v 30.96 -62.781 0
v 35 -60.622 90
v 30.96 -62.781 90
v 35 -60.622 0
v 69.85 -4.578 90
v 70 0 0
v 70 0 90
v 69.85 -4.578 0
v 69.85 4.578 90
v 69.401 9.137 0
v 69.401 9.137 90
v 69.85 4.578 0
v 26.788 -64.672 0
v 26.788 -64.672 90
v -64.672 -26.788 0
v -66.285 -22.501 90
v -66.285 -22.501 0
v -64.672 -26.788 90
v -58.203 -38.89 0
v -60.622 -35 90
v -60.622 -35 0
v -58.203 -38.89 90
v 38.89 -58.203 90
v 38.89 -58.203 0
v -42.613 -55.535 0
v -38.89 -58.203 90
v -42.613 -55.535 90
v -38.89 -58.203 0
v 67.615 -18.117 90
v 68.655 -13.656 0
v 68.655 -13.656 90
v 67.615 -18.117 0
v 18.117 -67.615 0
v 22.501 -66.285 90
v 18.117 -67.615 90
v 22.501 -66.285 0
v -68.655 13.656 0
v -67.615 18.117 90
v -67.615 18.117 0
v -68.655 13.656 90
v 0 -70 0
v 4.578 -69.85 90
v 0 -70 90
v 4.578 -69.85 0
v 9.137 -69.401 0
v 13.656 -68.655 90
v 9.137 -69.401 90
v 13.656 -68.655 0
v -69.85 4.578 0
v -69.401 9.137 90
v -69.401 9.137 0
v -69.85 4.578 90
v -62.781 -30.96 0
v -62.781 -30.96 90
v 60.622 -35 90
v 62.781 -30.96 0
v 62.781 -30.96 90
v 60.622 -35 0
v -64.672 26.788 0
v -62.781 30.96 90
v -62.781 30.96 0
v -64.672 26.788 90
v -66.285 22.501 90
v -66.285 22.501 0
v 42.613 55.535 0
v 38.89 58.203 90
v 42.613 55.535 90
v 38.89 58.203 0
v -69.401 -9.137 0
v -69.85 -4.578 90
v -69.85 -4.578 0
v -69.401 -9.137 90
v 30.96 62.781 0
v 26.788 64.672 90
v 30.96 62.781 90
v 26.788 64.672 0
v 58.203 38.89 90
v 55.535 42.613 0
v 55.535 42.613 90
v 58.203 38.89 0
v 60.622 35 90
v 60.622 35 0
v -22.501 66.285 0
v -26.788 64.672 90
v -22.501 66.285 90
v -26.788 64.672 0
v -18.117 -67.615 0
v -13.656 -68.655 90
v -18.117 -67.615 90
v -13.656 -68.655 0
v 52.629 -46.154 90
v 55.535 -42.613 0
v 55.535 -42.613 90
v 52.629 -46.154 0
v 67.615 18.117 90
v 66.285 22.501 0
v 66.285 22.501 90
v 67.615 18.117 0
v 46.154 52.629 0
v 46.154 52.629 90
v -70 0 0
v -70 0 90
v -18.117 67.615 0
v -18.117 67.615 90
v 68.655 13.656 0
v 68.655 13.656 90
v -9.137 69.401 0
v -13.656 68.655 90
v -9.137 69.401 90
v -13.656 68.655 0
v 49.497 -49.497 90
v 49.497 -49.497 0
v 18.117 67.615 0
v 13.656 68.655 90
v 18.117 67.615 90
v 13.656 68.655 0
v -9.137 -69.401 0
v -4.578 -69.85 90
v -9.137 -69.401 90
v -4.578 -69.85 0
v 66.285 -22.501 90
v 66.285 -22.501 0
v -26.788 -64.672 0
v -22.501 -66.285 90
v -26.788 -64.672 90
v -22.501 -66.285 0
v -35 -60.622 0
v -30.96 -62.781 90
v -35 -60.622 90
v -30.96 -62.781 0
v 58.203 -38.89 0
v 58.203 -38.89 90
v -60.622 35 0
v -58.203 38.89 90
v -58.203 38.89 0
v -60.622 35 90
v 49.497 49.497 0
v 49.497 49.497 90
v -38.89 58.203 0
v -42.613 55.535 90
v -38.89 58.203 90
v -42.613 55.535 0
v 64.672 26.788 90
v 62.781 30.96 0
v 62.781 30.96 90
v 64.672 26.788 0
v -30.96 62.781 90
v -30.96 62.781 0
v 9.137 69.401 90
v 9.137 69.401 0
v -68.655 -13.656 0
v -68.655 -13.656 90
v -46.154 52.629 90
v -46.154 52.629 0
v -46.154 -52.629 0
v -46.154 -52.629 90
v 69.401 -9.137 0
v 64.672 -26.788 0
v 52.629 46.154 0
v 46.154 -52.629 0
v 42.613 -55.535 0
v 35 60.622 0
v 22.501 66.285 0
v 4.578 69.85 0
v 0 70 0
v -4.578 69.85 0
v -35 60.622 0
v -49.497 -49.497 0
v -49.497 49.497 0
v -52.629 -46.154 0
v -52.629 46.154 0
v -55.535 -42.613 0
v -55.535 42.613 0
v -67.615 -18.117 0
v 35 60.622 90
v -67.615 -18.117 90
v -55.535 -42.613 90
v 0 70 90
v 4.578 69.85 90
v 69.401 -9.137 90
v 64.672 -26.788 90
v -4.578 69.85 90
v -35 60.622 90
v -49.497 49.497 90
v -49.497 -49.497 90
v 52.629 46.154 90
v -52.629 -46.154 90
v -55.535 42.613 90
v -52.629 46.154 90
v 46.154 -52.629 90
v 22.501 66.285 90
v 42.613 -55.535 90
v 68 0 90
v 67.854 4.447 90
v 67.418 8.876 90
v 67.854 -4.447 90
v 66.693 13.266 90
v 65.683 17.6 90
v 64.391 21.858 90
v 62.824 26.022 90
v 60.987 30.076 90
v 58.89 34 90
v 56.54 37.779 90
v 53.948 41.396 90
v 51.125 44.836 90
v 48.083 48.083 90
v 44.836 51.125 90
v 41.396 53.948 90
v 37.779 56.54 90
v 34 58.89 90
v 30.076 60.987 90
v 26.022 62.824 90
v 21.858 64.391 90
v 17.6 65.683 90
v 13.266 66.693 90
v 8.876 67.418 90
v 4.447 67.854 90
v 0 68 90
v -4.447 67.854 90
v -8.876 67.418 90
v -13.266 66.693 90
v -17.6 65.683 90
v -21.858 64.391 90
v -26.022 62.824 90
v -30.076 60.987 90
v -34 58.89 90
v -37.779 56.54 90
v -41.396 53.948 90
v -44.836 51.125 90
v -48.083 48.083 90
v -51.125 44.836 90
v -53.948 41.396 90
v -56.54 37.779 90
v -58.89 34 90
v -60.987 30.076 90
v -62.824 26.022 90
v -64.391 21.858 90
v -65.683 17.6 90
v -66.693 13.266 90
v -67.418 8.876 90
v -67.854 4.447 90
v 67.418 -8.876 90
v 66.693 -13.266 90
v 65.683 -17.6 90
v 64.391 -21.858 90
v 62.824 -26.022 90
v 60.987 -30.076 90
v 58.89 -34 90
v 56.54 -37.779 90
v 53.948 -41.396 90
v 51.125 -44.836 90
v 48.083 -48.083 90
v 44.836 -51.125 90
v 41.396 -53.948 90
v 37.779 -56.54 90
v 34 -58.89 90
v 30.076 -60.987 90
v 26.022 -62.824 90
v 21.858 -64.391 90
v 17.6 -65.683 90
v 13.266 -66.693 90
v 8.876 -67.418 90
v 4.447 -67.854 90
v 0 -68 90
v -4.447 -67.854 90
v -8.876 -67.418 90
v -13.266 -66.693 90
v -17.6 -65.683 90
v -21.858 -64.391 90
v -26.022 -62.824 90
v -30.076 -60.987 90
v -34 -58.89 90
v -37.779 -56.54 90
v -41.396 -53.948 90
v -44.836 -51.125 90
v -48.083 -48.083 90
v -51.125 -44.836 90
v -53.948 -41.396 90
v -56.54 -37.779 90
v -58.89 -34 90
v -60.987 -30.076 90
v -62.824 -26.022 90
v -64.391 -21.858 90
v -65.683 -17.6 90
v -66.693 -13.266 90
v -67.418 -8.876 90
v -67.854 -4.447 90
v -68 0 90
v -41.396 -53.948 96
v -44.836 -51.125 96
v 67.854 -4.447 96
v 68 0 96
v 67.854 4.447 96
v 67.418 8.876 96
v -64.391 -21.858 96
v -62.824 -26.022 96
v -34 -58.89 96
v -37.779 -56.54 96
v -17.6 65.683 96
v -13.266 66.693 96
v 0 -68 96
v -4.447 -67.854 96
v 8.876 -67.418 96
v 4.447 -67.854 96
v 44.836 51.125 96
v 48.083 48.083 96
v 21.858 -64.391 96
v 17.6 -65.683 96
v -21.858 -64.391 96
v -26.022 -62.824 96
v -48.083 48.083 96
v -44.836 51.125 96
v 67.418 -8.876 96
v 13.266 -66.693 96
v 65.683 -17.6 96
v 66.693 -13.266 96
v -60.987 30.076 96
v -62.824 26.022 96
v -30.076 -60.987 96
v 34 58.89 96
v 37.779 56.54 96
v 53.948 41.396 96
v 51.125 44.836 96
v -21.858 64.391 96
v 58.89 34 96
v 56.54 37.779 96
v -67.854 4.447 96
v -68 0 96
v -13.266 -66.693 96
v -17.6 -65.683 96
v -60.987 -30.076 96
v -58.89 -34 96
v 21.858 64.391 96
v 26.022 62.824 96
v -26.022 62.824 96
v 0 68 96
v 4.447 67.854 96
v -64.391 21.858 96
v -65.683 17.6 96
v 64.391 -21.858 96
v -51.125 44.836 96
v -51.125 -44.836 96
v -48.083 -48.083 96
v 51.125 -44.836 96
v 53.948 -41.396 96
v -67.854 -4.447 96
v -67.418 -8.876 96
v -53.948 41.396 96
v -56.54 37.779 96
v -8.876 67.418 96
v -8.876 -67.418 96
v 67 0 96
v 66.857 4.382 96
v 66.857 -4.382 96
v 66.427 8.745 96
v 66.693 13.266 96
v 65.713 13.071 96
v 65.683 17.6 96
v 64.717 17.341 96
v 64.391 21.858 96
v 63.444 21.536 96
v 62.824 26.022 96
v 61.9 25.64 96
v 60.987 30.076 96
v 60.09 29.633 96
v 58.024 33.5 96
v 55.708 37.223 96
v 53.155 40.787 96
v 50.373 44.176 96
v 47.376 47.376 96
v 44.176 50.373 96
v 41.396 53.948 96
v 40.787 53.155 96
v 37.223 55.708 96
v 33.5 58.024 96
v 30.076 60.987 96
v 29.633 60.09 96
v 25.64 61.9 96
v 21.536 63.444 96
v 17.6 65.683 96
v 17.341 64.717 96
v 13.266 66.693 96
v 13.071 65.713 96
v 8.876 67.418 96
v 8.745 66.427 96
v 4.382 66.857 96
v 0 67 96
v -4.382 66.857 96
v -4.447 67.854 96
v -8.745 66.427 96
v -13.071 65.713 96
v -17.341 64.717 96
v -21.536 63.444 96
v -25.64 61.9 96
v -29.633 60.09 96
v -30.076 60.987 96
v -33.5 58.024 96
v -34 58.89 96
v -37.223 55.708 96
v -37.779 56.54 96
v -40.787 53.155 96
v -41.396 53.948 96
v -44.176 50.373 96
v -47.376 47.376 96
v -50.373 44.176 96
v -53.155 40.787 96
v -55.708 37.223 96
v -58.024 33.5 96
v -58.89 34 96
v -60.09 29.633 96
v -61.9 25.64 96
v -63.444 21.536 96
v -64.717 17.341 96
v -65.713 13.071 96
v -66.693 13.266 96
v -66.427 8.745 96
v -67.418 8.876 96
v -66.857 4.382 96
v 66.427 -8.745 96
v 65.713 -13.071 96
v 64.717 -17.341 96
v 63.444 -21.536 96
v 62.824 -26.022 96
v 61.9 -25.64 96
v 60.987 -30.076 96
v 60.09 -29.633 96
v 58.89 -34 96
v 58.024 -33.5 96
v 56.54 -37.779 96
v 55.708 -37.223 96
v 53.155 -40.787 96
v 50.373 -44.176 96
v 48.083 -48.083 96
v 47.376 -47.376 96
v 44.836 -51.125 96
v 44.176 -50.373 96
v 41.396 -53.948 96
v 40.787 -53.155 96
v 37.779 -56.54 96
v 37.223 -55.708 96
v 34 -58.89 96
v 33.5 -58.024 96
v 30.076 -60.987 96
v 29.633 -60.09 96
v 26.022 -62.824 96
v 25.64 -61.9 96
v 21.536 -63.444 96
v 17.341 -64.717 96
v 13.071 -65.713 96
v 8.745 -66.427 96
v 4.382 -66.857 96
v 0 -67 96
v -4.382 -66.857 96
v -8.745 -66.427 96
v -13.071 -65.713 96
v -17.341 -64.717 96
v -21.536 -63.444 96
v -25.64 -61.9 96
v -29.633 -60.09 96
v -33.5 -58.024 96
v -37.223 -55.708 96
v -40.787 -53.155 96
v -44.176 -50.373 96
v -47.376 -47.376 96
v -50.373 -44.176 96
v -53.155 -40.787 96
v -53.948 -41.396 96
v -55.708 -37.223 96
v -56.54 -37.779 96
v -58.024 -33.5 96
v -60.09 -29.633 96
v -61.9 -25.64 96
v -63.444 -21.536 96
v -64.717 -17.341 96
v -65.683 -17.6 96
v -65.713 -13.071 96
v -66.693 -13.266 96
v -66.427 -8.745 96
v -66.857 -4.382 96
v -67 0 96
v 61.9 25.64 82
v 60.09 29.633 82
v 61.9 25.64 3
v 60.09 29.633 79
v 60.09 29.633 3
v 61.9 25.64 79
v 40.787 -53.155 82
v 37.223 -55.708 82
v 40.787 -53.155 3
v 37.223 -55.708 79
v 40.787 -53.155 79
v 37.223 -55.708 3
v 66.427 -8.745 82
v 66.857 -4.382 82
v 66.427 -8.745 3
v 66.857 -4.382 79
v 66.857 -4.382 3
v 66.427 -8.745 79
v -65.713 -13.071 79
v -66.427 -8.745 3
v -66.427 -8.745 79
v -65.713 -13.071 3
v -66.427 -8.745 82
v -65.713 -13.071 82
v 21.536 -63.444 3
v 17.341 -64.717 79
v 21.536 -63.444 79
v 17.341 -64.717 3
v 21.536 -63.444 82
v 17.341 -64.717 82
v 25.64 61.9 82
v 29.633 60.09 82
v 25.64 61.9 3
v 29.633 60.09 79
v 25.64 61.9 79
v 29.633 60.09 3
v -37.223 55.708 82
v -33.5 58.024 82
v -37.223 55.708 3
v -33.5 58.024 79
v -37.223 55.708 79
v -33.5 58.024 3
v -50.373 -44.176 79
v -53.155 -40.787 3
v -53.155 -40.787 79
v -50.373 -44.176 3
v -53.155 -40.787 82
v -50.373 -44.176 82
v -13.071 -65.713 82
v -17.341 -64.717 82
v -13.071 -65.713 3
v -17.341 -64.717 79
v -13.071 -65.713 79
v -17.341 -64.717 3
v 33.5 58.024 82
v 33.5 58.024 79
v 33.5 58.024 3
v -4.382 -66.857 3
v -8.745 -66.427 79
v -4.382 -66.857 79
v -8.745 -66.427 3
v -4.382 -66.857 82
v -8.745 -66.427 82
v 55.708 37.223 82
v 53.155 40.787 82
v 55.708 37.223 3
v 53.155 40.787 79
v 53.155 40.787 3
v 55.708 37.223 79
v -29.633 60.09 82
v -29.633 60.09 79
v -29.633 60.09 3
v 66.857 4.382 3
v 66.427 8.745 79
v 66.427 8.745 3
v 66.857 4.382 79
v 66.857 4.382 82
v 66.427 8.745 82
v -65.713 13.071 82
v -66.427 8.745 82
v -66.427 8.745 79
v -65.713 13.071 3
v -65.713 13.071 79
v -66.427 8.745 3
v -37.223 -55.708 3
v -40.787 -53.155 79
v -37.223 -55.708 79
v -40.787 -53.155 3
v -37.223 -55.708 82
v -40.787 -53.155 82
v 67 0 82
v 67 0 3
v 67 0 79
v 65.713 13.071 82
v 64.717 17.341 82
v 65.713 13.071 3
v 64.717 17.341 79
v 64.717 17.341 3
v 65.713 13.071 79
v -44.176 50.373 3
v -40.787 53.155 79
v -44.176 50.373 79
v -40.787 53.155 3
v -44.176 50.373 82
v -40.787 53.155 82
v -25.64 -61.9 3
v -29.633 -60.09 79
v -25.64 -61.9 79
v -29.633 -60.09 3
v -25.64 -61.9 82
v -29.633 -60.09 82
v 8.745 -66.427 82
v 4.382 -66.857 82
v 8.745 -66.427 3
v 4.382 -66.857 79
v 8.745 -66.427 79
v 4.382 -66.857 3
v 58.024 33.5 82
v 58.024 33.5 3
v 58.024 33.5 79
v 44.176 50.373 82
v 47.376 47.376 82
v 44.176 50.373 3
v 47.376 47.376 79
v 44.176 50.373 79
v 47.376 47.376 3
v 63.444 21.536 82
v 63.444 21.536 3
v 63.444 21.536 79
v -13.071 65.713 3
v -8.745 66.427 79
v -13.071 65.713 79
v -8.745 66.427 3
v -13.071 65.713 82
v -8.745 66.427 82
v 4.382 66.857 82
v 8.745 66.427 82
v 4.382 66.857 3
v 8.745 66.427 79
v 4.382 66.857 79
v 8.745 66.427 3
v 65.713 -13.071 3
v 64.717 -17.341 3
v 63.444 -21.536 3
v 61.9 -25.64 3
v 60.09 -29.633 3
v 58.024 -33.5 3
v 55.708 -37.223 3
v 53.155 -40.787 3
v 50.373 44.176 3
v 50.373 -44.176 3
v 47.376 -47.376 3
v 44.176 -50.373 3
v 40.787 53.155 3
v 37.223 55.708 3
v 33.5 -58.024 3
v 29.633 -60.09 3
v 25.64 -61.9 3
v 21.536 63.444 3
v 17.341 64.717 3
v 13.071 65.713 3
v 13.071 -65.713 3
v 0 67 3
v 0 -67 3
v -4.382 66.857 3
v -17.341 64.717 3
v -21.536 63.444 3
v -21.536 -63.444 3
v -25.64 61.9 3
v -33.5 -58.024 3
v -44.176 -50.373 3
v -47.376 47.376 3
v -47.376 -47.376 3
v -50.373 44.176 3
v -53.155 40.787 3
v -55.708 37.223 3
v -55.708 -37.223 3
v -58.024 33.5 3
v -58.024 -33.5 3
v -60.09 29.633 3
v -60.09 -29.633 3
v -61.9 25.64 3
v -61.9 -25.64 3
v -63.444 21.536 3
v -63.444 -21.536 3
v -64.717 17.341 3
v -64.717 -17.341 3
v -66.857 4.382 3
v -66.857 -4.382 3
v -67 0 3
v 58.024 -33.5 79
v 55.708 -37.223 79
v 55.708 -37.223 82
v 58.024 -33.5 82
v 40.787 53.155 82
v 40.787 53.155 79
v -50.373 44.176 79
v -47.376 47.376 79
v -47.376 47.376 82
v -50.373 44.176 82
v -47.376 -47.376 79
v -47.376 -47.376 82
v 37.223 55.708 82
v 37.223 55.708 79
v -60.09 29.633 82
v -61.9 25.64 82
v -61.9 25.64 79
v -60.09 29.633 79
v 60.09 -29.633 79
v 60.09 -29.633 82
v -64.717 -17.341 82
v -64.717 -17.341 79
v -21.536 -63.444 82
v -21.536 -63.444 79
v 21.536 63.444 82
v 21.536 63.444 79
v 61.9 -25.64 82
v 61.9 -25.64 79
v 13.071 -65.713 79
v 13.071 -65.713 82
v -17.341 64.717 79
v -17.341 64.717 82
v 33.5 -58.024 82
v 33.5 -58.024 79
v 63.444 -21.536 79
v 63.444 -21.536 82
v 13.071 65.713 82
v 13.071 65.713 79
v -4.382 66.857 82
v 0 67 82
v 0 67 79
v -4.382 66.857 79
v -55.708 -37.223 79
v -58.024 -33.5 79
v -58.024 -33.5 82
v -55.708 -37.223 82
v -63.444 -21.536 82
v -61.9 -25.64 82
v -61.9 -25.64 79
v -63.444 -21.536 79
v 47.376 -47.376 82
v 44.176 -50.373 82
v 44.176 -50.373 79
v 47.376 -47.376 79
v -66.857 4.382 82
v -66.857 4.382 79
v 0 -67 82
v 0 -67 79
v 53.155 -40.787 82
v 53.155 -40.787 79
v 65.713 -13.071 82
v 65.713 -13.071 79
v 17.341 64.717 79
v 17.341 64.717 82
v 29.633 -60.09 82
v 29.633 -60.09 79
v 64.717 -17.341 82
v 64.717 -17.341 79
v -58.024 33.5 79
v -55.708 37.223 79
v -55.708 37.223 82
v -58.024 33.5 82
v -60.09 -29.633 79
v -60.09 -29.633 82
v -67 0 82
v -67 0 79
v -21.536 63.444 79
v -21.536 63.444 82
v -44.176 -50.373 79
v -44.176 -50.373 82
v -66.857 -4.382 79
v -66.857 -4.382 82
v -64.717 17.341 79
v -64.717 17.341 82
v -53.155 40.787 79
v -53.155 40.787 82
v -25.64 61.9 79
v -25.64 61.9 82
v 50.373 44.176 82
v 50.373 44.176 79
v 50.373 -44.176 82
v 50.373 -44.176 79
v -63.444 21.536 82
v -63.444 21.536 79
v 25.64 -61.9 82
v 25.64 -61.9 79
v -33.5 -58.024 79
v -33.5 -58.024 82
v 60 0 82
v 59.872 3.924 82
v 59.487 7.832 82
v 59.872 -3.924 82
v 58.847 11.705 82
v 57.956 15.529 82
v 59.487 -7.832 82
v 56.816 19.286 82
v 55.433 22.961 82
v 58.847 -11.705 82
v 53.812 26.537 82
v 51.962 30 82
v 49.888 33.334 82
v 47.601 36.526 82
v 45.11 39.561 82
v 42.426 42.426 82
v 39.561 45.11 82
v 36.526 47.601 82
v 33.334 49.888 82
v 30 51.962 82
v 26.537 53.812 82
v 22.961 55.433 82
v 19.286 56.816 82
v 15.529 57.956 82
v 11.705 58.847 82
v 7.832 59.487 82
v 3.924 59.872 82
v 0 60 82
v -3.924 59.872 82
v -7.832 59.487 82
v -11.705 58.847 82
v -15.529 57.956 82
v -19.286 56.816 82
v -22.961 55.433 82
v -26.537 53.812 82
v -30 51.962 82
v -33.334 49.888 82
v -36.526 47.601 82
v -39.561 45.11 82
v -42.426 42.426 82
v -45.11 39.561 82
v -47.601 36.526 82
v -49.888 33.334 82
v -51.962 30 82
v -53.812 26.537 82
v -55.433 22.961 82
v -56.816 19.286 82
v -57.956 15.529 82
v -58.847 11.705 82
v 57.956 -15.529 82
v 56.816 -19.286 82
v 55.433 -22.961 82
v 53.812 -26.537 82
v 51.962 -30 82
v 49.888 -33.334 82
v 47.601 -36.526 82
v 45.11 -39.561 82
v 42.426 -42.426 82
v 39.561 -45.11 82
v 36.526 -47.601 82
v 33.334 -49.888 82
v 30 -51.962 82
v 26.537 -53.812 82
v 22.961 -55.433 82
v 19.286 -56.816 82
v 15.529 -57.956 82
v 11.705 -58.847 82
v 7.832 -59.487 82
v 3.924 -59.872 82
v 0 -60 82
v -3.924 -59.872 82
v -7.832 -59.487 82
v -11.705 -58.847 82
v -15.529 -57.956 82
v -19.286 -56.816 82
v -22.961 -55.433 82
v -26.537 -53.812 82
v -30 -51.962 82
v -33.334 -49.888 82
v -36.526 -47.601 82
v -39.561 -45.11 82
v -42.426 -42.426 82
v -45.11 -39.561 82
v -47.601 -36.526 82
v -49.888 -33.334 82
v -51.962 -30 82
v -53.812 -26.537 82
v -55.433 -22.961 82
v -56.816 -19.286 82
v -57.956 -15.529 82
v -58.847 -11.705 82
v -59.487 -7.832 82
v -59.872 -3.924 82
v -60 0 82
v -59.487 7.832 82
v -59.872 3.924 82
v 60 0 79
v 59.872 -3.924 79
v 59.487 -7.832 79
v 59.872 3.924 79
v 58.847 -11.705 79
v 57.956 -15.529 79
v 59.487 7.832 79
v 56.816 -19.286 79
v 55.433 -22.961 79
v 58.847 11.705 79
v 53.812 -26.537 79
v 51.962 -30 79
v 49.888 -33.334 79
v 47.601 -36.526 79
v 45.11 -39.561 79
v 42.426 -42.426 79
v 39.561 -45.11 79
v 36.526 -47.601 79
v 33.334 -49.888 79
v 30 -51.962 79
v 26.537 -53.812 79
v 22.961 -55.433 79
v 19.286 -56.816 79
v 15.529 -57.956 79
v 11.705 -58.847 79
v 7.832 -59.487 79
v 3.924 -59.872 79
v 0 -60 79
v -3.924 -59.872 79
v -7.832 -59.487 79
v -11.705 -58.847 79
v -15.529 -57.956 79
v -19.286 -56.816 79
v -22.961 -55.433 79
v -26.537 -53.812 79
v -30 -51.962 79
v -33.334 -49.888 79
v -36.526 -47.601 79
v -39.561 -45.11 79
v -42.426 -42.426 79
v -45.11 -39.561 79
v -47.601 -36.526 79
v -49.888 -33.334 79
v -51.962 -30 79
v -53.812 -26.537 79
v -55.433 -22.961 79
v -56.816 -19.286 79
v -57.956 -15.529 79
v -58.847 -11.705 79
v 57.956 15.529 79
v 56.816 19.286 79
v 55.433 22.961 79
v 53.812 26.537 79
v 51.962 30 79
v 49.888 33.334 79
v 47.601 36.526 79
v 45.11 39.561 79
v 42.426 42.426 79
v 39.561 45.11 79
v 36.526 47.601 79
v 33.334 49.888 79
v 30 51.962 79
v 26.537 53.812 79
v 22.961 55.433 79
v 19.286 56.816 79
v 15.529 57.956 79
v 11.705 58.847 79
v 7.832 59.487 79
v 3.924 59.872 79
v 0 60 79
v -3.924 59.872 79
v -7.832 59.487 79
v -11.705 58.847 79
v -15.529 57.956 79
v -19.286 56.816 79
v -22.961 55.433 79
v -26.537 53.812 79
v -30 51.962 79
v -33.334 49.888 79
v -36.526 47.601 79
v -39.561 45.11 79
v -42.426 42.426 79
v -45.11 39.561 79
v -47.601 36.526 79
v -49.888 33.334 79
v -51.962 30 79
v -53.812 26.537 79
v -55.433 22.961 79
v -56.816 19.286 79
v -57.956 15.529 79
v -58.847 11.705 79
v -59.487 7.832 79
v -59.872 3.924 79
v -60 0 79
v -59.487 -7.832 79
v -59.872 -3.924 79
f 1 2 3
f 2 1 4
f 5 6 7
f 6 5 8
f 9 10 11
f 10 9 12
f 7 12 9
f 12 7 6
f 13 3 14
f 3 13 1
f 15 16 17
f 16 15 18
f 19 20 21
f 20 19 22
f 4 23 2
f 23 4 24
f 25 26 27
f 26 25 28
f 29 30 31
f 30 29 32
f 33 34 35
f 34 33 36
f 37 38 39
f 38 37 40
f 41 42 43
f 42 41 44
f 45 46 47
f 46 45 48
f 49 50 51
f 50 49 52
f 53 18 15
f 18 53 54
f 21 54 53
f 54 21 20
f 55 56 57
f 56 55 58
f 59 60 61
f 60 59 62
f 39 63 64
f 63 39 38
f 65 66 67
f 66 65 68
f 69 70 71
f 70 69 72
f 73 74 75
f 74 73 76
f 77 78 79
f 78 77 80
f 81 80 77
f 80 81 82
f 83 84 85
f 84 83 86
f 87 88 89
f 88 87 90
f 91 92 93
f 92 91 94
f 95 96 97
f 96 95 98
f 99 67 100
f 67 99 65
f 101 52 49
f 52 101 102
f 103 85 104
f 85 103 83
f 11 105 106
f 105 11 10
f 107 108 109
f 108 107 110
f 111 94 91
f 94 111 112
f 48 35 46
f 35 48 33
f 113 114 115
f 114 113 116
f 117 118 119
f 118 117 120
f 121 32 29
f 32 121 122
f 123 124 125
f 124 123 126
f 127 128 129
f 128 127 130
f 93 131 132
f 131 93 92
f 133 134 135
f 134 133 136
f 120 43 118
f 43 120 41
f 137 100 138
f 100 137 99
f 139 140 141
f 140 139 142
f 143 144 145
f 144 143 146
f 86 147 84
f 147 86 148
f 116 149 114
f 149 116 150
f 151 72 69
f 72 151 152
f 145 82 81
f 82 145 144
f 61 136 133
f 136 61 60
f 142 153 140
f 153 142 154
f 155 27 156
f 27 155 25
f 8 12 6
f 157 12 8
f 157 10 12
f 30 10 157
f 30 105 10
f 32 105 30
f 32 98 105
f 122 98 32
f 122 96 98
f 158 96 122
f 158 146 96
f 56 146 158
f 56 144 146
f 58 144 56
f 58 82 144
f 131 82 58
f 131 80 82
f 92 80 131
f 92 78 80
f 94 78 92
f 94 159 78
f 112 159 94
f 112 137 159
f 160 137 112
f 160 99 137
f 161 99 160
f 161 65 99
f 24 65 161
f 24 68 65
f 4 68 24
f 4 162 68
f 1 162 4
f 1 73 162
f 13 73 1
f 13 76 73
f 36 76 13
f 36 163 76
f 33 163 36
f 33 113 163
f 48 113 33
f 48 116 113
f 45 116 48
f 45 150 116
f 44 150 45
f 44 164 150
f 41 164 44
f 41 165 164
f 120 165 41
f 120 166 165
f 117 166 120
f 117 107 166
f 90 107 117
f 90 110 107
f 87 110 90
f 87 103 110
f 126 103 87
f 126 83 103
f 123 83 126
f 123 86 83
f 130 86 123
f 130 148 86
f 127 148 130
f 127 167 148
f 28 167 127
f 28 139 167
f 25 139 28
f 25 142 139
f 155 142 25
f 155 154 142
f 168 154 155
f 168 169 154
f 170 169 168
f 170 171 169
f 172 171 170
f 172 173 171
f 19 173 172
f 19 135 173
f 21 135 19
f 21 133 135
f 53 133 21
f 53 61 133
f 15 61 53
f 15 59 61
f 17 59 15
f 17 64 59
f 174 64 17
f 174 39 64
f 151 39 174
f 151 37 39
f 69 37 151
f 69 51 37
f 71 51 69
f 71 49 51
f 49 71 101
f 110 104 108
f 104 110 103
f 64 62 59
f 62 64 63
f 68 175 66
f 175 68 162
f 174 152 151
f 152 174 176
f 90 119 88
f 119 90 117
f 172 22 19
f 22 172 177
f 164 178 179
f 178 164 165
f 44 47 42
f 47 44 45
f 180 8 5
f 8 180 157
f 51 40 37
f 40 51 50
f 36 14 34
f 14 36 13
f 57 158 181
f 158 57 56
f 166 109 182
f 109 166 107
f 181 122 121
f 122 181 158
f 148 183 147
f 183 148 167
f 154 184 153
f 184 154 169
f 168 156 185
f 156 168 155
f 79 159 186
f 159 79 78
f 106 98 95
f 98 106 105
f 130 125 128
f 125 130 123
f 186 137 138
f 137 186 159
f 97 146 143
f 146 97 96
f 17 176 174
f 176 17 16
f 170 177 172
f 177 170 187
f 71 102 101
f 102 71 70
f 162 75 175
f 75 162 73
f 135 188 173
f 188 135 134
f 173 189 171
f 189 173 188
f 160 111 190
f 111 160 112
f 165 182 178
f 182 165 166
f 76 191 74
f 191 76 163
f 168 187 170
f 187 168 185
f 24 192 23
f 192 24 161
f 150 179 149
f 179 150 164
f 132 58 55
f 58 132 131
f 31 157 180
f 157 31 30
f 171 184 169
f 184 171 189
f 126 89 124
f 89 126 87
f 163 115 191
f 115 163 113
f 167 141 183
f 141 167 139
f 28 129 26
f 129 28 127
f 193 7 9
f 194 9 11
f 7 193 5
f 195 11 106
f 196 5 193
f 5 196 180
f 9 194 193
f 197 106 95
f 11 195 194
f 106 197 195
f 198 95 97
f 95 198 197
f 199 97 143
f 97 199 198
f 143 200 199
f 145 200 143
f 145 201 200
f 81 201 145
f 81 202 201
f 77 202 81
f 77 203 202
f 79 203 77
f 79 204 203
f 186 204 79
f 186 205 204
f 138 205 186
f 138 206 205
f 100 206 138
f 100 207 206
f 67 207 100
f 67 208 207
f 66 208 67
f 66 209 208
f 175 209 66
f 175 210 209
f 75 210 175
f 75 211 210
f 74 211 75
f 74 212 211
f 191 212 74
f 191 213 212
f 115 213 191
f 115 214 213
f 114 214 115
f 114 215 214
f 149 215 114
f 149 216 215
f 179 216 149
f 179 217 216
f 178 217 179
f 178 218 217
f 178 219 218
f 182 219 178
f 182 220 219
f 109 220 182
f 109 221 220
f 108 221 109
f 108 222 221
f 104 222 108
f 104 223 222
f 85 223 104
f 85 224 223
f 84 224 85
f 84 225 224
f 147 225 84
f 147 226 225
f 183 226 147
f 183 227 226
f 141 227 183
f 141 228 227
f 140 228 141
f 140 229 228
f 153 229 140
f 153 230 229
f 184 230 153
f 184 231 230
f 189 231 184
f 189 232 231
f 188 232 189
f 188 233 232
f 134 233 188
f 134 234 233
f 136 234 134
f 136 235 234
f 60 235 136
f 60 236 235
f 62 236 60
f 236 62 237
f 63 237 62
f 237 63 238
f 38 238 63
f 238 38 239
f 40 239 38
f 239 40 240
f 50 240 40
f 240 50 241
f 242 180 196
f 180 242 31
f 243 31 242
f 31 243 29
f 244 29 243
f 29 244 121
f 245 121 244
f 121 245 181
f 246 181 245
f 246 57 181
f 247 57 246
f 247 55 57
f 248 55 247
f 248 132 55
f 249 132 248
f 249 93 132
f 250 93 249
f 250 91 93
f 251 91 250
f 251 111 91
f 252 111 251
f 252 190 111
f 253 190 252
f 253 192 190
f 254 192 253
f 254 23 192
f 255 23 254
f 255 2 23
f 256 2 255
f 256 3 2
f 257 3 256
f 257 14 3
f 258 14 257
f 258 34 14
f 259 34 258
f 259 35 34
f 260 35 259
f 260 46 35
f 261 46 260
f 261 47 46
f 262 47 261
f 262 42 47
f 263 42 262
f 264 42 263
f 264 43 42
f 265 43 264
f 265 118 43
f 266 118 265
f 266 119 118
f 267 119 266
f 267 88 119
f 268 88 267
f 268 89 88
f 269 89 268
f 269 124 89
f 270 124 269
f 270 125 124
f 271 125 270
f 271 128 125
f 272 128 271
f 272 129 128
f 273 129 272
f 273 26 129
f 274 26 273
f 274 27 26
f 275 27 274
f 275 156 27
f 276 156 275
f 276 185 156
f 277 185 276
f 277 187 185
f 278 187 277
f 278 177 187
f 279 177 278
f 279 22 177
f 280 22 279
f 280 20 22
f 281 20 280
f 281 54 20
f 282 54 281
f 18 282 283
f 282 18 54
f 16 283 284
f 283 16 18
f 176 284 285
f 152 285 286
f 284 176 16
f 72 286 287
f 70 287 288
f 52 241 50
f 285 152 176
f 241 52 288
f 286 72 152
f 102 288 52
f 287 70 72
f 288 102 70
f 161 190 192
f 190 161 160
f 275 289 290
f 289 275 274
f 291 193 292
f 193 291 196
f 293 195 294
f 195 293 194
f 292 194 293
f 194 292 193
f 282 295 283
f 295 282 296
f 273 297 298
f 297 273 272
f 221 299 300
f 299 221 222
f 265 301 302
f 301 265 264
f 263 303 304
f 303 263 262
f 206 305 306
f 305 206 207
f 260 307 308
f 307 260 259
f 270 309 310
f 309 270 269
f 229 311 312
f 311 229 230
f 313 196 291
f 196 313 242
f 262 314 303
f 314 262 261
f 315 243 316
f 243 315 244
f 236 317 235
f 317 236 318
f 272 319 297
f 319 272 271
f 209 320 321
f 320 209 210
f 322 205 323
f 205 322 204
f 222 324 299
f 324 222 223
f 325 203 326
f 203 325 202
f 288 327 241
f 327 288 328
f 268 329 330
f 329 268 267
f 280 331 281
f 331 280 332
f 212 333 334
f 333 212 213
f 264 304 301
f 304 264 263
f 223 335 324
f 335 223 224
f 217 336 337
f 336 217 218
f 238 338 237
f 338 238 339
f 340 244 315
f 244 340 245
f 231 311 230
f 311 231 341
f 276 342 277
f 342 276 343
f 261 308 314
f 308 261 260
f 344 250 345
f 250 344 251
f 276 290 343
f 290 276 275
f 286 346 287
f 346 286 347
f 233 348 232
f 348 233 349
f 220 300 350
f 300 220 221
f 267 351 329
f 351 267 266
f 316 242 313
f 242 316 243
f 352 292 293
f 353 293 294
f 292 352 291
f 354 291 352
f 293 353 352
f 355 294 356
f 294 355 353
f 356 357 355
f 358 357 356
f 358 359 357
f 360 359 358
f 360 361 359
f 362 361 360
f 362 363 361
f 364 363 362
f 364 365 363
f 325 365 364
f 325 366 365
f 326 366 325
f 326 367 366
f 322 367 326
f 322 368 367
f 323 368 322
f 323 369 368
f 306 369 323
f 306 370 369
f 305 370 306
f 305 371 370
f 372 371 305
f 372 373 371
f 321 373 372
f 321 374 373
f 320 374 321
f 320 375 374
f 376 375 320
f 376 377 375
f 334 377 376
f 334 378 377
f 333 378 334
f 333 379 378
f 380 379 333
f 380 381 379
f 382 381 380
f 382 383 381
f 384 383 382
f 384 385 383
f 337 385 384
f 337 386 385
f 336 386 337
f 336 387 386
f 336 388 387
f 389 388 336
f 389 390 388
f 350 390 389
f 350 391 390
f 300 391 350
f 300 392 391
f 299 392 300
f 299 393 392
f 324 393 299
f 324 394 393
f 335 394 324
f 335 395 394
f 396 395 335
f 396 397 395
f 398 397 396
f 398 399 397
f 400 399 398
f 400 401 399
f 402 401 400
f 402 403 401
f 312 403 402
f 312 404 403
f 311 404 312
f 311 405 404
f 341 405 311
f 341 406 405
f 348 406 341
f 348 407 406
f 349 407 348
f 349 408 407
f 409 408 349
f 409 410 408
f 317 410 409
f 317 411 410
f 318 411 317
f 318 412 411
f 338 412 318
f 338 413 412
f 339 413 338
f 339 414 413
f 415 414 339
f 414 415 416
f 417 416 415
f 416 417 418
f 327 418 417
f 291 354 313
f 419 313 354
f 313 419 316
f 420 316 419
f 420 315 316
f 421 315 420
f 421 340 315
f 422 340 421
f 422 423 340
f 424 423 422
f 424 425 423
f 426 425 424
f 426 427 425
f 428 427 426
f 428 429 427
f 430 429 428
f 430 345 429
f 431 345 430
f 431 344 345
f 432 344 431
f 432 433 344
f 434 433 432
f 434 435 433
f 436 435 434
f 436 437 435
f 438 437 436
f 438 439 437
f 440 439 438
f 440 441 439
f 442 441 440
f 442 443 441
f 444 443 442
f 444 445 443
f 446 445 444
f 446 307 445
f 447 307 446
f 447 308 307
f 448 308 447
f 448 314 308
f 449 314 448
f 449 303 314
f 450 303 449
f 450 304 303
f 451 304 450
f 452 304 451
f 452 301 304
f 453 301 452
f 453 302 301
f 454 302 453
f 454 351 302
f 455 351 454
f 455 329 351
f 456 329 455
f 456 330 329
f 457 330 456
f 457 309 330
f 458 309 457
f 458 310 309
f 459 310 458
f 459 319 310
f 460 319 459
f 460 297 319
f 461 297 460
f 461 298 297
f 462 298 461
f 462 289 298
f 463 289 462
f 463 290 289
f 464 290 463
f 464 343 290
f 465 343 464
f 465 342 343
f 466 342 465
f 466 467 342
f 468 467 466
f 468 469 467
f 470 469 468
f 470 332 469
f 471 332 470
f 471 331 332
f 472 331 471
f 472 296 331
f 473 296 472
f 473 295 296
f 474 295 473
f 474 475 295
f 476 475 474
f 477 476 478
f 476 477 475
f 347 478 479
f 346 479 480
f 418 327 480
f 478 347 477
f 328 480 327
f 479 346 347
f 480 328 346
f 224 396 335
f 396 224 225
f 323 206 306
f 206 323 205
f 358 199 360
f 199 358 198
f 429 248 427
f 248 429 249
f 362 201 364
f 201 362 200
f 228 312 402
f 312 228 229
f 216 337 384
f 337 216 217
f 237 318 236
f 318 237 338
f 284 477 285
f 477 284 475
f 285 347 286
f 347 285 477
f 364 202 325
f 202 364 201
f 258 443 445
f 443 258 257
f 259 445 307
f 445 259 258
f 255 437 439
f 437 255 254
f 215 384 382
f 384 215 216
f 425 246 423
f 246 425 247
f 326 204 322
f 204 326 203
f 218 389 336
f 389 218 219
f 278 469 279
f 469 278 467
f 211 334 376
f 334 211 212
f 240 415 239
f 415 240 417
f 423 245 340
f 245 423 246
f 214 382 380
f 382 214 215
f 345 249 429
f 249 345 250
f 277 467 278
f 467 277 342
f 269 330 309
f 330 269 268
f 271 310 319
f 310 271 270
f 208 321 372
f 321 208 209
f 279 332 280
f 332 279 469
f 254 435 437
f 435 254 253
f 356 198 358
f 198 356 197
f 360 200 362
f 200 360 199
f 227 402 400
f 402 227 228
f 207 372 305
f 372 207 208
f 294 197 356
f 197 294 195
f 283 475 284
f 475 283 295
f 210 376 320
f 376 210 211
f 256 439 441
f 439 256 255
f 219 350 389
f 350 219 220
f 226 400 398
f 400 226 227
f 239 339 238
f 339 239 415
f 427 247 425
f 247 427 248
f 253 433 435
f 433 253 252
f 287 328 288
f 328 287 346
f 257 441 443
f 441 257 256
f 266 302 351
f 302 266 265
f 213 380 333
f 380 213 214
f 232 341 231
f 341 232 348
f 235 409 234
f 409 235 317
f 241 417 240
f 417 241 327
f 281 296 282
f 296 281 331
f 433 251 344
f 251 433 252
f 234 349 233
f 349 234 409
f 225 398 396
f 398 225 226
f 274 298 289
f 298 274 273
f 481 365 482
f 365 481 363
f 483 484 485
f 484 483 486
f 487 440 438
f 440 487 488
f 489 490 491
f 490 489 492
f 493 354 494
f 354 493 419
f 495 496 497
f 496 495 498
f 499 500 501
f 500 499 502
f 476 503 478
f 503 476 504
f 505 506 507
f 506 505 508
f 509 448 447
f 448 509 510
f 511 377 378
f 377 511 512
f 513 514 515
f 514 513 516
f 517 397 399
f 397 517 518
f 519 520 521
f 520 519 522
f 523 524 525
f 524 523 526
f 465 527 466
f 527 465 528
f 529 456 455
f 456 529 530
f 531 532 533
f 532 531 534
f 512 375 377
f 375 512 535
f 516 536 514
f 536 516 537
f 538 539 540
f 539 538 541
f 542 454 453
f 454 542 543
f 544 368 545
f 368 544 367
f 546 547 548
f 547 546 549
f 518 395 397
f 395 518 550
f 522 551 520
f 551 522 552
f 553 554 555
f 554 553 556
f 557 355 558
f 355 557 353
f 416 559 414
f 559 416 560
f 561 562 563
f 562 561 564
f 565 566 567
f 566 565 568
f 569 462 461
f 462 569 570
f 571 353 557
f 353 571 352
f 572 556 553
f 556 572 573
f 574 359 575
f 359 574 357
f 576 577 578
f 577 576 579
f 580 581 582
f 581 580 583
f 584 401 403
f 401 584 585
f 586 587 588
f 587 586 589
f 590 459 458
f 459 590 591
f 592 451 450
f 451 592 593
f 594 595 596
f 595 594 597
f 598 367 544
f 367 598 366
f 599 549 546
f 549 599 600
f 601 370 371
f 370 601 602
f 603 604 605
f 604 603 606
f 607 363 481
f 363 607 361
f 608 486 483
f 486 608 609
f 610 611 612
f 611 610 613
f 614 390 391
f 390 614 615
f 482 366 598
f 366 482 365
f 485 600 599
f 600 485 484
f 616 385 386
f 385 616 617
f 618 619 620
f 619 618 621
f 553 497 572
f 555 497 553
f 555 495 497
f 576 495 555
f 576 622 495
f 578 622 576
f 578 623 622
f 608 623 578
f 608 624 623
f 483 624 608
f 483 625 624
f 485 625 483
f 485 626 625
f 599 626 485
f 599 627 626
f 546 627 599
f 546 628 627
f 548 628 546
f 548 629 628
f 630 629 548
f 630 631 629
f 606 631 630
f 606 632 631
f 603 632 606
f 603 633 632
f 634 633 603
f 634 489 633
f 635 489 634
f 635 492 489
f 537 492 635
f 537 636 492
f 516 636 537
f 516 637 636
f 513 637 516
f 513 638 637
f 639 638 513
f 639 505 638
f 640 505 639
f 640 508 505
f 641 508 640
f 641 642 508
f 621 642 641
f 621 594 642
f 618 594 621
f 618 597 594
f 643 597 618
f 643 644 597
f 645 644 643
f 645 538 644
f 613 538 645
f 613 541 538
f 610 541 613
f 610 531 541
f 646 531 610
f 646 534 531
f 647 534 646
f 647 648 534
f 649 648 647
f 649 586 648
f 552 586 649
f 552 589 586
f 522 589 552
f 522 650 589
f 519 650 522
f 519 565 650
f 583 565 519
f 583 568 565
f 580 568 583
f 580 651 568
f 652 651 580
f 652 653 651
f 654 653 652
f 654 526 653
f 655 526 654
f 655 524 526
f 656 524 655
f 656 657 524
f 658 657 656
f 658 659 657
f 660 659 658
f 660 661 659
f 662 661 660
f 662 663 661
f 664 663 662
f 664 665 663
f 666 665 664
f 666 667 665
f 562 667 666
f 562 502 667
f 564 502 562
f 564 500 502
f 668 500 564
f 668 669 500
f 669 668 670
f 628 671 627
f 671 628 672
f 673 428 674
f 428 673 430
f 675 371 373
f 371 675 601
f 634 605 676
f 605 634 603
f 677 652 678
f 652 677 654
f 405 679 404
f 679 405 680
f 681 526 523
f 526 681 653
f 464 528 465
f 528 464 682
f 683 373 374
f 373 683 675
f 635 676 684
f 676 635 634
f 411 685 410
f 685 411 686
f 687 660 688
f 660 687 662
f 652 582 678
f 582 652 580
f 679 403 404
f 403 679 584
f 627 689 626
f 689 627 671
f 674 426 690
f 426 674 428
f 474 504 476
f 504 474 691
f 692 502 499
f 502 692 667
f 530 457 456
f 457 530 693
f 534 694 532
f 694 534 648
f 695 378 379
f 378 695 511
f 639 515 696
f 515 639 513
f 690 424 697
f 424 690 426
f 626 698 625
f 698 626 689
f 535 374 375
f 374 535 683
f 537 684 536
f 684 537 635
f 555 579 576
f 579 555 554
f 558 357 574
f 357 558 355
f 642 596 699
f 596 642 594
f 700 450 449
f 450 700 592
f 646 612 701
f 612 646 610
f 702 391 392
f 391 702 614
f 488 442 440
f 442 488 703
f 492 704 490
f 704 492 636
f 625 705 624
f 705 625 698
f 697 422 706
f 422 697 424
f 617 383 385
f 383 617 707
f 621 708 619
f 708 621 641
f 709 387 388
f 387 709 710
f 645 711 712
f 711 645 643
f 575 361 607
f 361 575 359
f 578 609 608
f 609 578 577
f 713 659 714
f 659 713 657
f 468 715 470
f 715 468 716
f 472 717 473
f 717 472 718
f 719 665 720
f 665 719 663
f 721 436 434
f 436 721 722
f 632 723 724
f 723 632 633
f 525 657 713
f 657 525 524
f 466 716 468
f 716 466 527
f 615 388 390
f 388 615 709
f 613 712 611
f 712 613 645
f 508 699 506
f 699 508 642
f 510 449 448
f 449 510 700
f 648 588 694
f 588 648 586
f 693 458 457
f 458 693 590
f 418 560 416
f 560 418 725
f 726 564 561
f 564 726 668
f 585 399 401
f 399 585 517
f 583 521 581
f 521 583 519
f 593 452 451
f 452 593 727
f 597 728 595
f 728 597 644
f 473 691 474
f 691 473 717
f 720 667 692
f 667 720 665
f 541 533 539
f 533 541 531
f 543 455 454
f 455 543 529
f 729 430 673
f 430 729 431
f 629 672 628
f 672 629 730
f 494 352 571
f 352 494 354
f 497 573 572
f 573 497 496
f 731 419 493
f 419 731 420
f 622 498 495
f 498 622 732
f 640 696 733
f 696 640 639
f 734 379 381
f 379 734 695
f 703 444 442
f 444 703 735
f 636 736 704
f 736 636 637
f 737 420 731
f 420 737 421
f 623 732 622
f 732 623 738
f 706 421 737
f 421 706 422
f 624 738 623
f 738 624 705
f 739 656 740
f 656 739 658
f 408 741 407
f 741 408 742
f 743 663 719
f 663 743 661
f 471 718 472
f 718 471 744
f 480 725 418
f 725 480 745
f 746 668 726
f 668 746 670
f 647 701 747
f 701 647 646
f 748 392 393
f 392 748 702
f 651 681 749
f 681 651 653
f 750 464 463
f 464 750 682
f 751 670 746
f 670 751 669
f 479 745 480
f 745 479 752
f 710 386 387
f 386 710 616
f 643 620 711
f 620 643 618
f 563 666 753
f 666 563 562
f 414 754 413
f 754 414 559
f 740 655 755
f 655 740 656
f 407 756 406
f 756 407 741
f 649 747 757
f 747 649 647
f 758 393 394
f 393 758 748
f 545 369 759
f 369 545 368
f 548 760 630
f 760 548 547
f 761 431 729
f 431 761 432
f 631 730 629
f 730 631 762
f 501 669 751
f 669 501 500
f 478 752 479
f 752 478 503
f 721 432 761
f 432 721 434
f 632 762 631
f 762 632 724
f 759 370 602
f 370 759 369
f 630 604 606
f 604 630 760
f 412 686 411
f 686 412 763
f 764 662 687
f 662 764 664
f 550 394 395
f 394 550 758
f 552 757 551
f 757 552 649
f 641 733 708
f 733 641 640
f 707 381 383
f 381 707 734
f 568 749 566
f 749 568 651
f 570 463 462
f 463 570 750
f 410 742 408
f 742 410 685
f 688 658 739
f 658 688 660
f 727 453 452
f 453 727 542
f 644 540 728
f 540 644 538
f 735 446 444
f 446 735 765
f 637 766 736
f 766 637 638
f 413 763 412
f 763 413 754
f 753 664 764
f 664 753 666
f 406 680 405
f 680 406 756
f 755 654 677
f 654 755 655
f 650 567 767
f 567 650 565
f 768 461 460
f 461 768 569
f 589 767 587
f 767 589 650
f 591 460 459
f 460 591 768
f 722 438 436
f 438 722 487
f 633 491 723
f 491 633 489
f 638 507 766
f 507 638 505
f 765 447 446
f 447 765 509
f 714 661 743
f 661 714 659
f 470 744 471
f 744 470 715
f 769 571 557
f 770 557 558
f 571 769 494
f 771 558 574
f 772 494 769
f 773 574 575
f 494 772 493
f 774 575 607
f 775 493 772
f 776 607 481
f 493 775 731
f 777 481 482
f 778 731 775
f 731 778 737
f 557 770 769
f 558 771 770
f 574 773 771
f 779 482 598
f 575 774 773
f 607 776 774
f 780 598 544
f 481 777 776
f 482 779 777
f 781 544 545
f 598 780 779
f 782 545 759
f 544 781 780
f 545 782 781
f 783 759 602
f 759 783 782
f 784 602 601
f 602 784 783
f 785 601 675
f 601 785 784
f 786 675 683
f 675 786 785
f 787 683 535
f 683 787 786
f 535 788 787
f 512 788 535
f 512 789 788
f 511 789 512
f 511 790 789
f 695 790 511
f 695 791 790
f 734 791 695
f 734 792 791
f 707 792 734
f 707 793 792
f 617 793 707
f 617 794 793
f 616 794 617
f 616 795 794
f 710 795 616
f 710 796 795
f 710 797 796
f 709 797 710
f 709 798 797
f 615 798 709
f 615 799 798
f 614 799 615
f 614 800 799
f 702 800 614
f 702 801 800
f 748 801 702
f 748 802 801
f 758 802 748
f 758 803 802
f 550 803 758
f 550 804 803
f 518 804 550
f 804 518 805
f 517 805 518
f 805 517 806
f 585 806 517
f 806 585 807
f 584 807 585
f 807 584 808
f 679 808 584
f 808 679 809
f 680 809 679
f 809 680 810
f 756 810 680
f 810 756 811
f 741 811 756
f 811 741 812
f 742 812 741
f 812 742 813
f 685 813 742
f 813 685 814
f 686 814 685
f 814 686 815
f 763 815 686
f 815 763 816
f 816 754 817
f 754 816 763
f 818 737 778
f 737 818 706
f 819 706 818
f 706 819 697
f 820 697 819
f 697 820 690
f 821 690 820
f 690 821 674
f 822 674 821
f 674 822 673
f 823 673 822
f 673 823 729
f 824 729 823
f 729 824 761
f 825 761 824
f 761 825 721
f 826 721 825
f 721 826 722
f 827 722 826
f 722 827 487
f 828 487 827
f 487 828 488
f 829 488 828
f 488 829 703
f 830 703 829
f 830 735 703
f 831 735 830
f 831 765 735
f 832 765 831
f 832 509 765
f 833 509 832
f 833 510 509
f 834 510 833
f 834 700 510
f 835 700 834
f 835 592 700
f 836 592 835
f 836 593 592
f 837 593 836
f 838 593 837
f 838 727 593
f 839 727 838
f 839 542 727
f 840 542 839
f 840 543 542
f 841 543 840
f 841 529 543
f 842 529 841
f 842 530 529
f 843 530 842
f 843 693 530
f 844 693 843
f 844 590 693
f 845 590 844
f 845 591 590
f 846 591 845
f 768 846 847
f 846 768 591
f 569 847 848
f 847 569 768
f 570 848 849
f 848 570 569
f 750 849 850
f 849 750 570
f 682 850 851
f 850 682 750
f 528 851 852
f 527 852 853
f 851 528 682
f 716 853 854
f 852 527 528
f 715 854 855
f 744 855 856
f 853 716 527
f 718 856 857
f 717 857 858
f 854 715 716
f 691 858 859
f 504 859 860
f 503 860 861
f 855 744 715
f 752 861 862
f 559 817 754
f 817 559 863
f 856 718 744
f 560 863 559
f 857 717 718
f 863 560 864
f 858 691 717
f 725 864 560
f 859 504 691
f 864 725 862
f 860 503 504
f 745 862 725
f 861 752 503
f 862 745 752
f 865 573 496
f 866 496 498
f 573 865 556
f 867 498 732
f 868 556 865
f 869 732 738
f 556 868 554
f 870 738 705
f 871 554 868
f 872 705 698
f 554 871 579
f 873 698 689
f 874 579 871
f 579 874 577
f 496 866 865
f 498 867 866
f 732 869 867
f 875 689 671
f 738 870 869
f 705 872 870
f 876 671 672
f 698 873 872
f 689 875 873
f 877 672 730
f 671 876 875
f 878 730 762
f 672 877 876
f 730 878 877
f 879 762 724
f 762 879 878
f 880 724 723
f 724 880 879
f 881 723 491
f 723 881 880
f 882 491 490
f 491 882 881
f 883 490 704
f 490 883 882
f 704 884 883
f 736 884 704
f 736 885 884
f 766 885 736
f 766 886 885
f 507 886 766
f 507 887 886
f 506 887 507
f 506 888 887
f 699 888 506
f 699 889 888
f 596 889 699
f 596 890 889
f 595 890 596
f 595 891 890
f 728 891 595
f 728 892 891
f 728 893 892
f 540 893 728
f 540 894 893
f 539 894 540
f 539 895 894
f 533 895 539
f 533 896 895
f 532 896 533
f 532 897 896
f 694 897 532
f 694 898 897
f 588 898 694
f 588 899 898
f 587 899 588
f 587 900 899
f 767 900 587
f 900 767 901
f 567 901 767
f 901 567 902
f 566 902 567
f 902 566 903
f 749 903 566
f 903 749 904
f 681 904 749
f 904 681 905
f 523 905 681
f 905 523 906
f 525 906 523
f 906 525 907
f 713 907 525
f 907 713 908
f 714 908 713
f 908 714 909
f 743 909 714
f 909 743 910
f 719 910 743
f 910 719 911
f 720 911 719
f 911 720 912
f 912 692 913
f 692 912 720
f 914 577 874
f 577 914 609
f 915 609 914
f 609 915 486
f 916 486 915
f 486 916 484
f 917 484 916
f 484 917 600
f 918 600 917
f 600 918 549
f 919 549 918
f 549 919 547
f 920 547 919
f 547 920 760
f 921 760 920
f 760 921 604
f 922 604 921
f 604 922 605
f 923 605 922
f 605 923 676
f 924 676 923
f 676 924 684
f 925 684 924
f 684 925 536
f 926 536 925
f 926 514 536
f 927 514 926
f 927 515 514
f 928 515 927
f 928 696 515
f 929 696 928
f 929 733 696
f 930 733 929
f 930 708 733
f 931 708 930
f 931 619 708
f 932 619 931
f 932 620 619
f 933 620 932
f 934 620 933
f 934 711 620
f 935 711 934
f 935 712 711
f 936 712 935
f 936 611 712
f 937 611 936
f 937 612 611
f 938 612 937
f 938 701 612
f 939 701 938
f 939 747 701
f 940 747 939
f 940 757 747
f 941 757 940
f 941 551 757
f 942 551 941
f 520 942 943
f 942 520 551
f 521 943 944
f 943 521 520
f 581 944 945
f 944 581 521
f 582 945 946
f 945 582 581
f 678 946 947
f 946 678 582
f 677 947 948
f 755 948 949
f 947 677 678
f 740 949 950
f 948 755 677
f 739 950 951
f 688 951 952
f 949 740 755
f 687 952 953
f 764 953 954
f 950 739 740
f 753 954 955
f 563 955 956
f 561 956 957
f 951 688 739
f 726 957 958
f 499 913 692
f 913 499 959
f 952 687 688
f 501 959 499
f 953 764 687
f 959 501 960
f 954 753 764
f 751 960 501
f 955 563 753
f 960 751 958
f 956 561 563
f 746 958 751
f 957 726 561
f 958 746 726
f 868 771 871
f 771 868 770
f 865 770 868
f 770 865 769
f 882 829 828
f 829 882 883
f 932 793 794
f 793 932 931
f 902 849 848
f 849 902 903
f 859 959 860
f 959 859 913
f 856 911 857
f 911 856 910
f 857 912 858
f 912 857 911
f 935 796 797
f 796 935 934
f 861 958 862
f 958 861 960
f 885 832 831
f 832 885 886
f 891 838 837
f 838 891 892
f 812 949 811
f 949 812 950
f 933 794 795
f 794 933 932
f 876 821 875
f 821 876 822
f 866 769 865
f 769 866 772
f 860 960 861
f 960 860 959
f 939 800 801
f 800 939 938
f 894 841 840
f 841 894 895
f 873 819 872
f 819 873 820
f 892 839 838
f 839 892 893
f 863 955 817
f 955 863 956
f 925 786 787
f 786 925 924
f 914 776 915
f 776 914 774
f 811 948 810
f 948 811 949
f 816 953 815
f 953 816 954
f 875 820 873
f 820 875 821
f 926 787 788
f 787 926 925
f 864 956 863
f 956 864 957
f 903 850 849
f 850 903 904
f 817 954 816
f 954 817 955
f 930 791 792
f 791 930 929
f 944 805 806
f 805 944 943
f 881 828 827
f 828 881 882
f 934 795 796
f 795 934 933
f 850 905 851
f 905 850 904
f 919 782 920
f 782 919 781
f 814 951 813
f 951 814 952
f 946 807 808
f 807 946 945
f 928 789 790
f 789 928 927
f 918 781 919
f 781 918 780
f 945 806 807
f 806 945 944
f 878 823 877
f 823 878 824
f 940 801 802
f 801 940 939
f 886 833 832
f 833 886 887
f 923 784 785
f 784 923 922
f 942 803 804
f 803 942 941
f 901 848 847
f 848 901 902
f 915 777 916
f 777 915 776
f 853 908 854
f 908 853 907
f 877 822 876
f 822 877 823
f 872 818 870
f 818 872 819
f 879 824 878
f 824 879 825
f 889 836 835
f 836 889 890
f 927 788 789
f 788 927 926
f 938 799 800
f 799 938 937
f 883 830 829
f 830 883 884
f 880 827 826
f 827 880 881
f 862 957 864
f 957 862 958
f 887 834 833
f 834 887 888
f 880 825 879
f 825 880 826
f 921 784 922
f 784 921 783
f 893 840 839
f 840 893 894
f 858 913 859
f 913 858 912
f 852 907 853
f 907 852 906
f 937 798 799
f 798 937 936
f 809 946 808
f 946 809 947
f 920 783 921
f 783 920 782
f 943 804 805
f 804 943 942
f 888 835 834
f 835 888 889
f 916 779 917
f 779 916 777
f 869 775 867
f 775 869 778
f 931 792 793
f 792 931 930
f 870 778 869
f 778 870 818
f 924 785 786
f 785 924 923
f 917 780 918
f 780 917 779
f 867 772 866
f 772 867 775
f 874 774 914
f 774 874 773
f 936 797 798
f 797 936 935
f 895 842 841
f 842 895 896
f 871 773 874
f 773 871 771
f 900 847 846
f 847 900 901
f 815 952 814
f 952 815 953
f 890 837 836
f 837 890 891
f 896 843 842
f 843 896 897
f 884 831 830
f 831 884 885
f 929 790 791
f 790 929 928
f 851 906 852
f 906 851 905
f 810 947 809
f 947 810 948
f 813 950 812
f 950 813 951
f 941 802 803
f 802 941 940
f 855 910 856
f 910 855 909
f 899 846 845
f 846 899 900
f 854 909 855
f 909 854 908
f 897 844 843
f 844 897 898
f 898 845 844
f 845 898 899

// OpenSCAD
// file: params.scad
// ============================================================================
//  Smart Grow Topf — zentrale Parameter
//  Alle Maße in mm. Verbindliche Werte: docs/02_architektur-und-geometrie.md
//  Hier aendern, nichts in den Bauteilen hart verdrahten.
// ============================================================================

// ---- Render-Qualitaet -------------------------------------------------------
$fn = 96;          // Zylinder-/Rotationsaufloesung (Druck: 96 genuegt)

// ---- Grundkoerper -----------------------------------------------------------
shell_od    = 140.0;                 // Aussen-Durchmesser Topf
wall        = 3.0;                   // Wandstaerke
shell_or    = shell_od / 2;          // 70.0
shell_ir    = shell_or - wall;       // 67.0  Innen-Durchmesser = 134
total_h     = 278.0;                 // Gesamthoehe ohne Pflanze
floor_t     = 3.0;                   // Bodenstaerke Tank

// ---- Wassertank -------------------------------------------------------------
tank_h      = 82.0;                  // Innenhoehe bis Rostauflage
max_water   = 71.0;                  // max. Wasserstand (1,0 L)

// ---- Auflagerost / Trennplatte ---------------------------------------------
grid_t      = 4.0;                   // Dicke
grid_od     = 132.0;                 // Aussen-Durchmesser
grid_or     = grid_od / 2;           // 66.0
grid_z0     = tank_h;                // 82.0
grid_z1     = grid_z0 + grid_t;      // 86.0
grid_hole_d = 4.0;                   // Lochung (haelt Blahton zurueck)
grid_pitch  = 9.0;
grid_rim    = 4.0;                   // ungelochter Rand
ledge_ir    = 60.0;                  // Auflagering innen (Tankseite)
ledge_h     = 3.0;
ledge_z1    = grid_z0;               // 82.0
ledge_z0    = ledge_z1 - ledge_h;    // 79.0

// ---- Luftspalt / Innentopf --------------------------------------------------
air_gap     = 30.0;                  // 86 -> 116 ueber max. Wasserstand
pot_z0      = grid_z1 + air_gap;     // 116.0
pot_h       = 150.0;                 // Erdbehaelterhoehe
pot_od      = 132.0;
pot_or      = pot_od / 2;            // 66.0
pot_wall    = 2.5;
pot_ir      = pot_or - pot_wall;     // 63.5
pot_floor_t = 3.0;
pot_z1      = pot_z0 + pot_h;        // 266.0
foot_h      = air_gap;               // Giessfuesse
n_feet      = 6;
foot_r      = 58.0;                  // Fussradius
foot_w      = 12.0;                  // tangentiale Fussbreite
foot_d      = 8.0;                   // radiale Fusstiefe
drain_hole_d = 4.0;
drain_pitch  = 10.0;

// ---- Kragen / Ringauflage ---------------------------------------------------
collar_z0   = pot_z1;                // 266.0
collar_z1   = total_h;               // 278.0
collar_h    = collar_z1 - collar_z0;// 12.0
collar_r    = shell_or + 2.0;        // 72.0 Ausstellungsradius

// ---- Wulst (Elektronik + Kanaele) -------------------------------------------
wulst_z0      = 90.0;
wulst_h       = 160.0;
wulst_z1      = wulst_z0 + wulst_h;  // 250.0
wulst_w       = 60.0;                // tangential (X)
wulst_d       = 40.0;                // radial, ab Mantel
wulst_y_outer = shell_or + wulst_d;  // 110.0
wulst_cr      = 8.0;                 // Eckradius (vertikal)
wulst_wall    = 6.0;                 // Wandstaerke Wulst
wulst_taper   = 40.0;                // 45-Grad-Bodenfase (stuetztragfrei)

// Innenraum (Elektronikkammer)
wc_x   = 20.0;                       // halbe Breite
wc_y0  = 72.0;                       // innen (hinter der Mantelwand)
wc_y1  = wulst_y_outer + 2.0;        // vorne (durch Deckeloeffnung)
wc_z0  = wulst_z0 + 2.0;             // 92.0
wc_z1  = wulst_z1 - wulst_wall;      // 244.0

// Kanaele
cable_d  = 4.5;                      // Sensorkabel
cable_z  = 246.0;
hose_w   = 6.0;                      // Schlauchkanal
hose_z   = 100.0;
pressure_hole_d = 6.5;               // Druckschlauch nach oben
pressure_x = 14.0;
pressure_y = 98.0;

// Deckel-Verschraubung (Innengewinde-Platzhalter fuer M2.5)
boss_d    = 7.0;
boss_hole_d = 2.4;
boss_x    = 17.0;
boss_z    = [100.0, 234.0];

// Tropfkante Wulstboden
drip_band = 1.6;                     // radiale Ueberlappung
drip_h    = 1.6;
drip_z    = wulst_z0 + wulst_taper - 1.0;  // 129.0

// ---- Bauteil-Footprints (Elektronik) ---------------------------------------
xiao_w   = 21.0;                     // XIAO ESP32-C6
xiao_l   = 17.5;
pcb_l    = 52.0;                     // Eigenbau-PCB
pcb_w    = 42.0;
pcb_t    = 1.6;
batt_l   = 59.0;                     // EFASO 503759
batt_w   = 37.0;
batt_t   = 5.0;
pump_d   = 27.8;                     // Adafruit 3910
pump_l   = 66.8;
pump_mount_d = 3.7;                  // Montagebohrungen
pump_mount_cc = 50.0;                // Lochabstand
usb_w    = 9.5;                      // USB-C Durchbruch
usb_h    = 3.6;
led_d    = 5.0;

// ---- Verteilerring ----------------------------------------------------------
ring_od       = 105.0;               // <= 105
ring_or       = ring_od / 2;         // 52.5
ring_ir       = 38.0;                // innere Oeffnung
ring_h        = 16.0;
ring_wall     = 2.2;
ring_holes    = 10;                  // 8..12
ring_hole_d   = 2.6;
ring_hole_r   = ring_ir + 5.0;       // Bohrkreis (innen/ unten)
ring_barb_len = 12.0;
ring_barb_od  = 5.6;
ring_barb_id  = 3.8;

// ---- Abdeckung (optional) ---------------------------------------------------
cover_od   = 136.0;
cover_t    = 3.0;
cover_hole = 45.0;

// ---- Segmentierung (Bauraum 220 x 220 x 250) --------------------------------
split_z    = wulst_z0;               // 90.0  Trennebene unten/oben
spigot_h   = 6.0;                    // Steckzapfen
spigot_or  = shell_or - 2.0;         // 68.0
socket_ir  = spigot_or + 0.6;        // 68.6 Einsteck-Spiel
// main file
// Aussenschale unten (Wassertank + Steckzapfen) — Druckteil
include <modules.scad>
shell_lower();
